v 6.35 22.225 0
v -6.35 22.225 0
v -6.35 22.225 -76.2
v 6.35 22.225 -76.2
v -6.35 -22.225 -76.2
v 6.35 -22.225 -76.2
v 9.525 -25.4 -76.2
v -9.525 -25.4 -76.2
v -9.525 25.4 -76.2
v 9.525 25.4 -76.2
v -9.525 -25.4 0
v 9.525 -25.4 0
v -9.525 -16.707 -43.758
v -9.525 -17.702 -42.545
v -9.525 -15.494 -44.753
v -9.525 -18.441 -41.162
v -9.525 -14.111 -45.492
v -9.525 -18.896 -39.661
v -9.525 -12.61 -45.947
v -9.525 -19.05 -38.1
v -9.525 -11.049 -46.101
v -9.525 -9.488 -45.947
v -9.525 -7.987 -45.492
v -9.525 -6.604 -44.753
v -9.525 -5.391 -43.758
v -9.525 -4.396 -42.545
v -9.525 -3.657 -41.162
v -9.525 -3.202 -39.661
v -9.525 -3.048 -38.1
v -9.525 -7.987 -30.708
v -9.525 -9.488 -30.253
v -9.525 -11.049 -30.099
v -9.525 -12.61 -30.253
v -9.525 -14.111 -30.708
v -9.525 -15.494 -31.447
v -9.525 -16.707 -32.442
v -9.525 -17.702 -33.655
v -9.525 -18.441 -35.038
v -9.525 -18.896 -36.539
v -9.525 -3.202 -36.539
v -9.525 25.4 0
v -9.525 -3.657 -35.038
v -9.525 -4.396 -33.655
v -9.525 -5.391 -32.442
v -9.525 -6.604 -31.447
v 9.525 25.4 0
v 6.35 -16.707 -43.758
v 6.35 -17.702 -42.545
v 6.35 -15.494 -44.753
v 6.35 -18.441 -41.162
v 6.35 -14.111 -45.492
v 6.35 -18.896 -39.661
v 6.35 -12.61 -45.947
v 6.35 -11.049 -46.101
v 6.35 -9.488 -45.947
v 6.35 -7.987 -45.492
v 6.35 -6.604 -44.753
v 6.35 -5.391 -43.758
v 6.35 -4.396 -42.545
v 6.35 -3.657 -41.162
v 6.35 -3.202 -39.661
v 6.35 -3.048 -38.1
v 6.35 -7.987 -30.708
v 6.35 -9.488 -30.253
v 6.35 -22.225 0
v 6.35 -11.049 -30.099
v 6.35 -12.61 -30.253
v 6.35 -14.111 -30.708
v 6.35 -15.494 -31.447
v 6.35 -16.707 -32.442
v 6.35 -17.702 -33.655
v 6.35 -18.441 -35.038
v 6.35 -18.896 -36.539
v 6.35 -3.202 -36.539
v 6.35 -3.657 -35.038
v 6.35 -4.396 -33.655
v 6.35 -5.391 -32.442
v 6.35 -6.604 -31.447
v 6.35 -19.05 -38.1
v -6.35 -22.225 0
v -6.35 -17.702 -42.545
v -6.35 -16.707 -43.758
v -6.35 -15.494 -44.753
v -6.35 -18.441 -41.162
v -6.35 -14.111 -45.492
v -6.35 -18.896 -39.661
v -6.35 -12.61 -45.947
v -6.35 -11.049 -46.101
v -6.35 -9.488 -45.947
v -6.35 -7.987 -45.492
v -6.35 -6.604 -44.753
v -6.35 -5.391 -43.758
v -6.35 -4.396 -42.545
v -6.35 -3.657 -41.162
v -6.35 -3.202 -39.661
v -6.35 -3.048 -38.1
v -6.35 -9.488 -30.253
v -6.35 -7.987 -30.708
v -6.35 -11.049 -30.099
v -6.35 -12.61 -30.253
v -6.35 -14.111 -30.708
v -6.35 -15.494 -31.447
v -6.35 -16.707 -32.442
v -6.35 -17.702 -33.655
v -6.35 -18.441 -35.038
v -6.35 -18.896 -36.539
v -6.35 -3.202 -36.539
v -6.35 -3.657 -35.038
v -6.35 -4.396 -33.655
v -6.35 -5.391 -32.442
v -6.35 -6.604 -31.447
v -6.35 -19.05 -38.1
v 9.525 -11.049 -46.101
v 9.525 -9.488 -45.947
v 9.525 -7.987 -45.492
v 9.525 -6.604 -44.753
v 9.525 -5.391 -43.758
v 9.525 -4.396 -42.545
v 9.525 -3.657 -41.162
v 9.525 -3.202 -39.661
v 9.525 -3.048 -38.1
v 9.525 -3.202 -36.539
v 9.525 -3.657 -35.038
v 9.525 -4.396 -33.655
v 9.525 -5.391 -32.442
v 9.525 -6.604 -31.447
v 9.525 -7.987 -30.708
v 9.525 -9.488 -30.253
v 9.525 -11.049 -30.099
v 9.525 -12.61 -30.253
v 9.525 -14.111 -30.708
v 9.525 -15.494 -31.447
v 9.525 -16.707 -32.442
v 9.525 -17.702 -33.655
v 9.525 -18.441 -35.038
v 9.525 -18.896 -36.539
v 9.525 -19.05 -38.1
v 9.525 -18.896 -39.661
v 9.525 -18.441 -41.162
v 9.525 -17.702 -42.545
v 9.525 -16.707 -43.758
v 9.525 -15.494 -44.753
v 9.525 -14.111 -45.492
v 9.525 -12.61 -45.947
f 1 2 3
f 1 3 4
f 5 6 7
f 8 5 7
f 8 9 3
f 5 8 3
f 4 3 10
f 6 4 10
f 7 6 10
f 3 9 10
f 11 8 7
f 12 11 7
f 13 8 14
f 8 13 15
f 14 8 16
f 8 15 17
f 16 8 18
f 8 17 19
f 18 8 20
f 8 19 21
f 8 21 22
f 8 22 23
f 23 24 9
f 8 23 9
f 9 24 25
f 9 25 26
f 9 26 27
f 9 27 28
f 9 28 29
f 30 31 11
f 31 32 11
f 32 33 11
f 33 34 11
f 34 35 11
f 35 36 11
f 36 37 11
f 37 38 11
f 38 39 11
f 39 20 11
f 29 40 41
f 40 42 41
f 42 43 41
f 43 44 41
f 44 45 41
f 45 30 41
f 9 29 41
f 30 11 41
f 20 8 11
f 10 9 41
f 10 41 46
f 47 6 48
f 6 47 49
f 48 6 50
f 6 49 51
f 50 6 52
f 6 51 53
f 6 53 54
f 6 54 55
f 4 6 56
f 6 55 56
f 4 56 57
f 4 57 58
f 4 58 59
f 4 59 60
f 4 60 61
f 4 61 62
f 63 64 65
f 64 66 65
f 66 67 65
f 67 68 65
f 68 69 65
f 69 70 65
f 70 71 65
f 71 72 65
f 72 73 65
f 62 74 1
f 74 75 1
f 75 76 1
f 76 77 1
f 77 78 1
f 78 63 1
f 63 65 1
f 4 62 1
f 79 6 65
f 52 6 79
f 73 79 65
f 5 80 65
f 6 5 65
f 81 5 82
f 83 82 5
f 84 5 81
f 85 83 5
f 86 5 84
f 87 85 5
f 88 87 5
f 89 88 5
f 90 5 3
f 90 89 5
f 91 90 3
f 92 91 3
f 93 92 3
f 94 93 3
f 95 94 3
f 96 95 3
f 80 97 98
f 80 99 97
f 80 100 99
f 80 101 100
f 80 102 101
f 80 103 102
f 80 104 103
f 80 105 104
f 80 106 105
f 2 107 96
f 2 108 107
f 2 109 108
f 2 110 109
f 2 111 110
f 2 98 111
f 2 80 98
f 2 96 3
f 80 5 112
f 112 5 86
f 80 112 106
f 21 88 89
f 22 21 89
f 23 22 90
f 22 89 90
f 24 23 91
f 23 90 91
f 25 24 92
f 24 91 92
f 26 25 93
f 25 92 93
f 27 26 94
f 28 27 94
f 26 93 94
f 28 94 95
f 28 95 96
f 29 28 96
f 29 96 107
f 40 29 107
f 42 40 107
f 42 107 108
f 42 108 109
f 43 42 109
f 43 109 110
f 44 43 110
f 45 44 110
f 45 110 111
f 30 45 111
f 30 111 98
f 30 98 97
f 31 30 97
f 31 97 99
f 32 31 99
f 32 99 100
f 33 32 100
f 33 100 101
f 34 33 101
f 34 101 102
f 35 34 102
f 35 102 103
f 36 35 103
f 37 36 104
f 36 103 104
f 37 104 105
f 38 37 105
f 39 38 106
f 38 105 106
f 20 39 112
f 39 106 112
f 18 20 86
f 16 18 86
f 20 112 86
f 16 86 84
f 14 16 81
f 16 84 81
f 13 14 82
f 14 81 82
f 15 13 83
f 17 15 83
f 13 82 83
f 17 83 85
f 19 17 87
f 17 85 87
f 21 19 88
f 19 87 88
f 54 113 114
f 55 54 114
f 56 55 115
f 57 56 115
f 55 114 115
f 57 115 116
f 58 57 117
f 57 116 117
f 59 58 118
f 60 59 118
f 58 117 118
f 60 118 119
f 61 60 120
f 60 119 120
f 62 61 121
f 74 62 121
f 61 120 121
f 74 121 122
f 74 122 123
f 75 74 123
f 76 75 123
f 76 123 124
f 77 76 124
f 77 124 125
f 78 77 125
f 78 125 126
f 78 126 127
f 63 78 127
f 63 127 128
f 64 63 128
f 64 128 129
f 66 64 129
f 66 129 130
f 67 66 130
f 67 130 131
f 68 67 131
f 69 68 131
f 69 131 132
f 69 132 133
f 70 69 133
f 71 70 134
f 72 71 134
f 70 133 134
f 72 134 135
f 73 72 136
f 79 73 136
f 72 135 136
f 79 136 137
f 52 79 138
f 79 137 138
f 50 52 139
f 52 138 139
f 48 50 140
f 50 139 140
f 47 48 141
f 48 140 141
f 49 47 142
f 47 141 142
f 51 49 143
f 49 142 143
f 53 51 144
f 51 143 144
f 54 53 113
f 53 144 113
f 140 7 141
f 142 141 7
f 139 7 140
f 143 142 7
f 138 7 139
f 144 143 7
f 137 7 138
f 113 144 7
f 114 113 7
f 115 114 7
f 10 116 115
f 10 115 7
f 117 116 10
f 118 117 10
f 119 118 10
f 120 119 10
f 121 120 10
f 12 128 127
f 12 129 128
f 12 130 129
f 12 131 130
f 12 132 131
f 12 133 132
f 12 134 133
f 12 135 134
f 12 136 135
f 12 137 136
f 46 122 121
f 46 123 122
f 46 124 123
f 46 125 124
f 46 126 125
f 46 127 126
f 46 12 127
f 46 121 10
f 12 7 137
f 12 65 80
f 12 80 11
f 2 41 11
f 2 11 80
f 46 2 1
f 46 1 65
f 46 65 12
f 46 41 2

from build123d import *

# Parameters (mm, degrees)
SKETCH1_W           = 19.05
SKETCH1_H           = 50.8
BOSS_EXTRUDE1_DEPTH = 76.2
CUT_EXTRUDE1_REACH  = 78.2
SKETCH2_W           = 12.7
SKETCH2_H           = 44.45
SKETCH4_R           = 8.001
CUT_EXTRUDE2_DEPTH  = 20.05


with BuildPart() as part:
    # Sketch1 → Boss-Extrude1 (new body)
    with BuildSketch(Plane.XY):
        Rectangle(SKETCH1_W, SKETCH1_H)
    extrude(amount=-BOSS_EXTRUDE1_DEPTH)

    # Sketch2 → Cut-Extrude1 (cut, up to next)
    with BuildSketch(Plane.XY, mode=Mode.PRIVATE) as cut_extrude1_sk1:
        Rectangle(SKETCH2_W, SKETCH2_H)
    cut_extrude1_tool1 = extrude(cut_extrude1_sk1.sketch, amount=-CUT_EXTRUDE1_REACH, mode=Mode.PRIVATE) & part.part
    add(cut_extrude1_tool1.solids().sort_by_distance((0, 0, 0))[0], mode=Mode.SUBTRACT)

    # Sketch4 → Cut-Extrude2 (cut, through all)
    with BuildSketch(Plane(origin=(9.525, 0, 0), x_dir=(0, 0, -1), z_dir=(1, 0, 0))):
        with Locations((38.1, -11.049)):
            Circle(SKETCH4_R)
    extrude(amount=-CUT_EXTRUDE2_DEPTH, mode=Mode.SUBTRACT)


solid = part.part
